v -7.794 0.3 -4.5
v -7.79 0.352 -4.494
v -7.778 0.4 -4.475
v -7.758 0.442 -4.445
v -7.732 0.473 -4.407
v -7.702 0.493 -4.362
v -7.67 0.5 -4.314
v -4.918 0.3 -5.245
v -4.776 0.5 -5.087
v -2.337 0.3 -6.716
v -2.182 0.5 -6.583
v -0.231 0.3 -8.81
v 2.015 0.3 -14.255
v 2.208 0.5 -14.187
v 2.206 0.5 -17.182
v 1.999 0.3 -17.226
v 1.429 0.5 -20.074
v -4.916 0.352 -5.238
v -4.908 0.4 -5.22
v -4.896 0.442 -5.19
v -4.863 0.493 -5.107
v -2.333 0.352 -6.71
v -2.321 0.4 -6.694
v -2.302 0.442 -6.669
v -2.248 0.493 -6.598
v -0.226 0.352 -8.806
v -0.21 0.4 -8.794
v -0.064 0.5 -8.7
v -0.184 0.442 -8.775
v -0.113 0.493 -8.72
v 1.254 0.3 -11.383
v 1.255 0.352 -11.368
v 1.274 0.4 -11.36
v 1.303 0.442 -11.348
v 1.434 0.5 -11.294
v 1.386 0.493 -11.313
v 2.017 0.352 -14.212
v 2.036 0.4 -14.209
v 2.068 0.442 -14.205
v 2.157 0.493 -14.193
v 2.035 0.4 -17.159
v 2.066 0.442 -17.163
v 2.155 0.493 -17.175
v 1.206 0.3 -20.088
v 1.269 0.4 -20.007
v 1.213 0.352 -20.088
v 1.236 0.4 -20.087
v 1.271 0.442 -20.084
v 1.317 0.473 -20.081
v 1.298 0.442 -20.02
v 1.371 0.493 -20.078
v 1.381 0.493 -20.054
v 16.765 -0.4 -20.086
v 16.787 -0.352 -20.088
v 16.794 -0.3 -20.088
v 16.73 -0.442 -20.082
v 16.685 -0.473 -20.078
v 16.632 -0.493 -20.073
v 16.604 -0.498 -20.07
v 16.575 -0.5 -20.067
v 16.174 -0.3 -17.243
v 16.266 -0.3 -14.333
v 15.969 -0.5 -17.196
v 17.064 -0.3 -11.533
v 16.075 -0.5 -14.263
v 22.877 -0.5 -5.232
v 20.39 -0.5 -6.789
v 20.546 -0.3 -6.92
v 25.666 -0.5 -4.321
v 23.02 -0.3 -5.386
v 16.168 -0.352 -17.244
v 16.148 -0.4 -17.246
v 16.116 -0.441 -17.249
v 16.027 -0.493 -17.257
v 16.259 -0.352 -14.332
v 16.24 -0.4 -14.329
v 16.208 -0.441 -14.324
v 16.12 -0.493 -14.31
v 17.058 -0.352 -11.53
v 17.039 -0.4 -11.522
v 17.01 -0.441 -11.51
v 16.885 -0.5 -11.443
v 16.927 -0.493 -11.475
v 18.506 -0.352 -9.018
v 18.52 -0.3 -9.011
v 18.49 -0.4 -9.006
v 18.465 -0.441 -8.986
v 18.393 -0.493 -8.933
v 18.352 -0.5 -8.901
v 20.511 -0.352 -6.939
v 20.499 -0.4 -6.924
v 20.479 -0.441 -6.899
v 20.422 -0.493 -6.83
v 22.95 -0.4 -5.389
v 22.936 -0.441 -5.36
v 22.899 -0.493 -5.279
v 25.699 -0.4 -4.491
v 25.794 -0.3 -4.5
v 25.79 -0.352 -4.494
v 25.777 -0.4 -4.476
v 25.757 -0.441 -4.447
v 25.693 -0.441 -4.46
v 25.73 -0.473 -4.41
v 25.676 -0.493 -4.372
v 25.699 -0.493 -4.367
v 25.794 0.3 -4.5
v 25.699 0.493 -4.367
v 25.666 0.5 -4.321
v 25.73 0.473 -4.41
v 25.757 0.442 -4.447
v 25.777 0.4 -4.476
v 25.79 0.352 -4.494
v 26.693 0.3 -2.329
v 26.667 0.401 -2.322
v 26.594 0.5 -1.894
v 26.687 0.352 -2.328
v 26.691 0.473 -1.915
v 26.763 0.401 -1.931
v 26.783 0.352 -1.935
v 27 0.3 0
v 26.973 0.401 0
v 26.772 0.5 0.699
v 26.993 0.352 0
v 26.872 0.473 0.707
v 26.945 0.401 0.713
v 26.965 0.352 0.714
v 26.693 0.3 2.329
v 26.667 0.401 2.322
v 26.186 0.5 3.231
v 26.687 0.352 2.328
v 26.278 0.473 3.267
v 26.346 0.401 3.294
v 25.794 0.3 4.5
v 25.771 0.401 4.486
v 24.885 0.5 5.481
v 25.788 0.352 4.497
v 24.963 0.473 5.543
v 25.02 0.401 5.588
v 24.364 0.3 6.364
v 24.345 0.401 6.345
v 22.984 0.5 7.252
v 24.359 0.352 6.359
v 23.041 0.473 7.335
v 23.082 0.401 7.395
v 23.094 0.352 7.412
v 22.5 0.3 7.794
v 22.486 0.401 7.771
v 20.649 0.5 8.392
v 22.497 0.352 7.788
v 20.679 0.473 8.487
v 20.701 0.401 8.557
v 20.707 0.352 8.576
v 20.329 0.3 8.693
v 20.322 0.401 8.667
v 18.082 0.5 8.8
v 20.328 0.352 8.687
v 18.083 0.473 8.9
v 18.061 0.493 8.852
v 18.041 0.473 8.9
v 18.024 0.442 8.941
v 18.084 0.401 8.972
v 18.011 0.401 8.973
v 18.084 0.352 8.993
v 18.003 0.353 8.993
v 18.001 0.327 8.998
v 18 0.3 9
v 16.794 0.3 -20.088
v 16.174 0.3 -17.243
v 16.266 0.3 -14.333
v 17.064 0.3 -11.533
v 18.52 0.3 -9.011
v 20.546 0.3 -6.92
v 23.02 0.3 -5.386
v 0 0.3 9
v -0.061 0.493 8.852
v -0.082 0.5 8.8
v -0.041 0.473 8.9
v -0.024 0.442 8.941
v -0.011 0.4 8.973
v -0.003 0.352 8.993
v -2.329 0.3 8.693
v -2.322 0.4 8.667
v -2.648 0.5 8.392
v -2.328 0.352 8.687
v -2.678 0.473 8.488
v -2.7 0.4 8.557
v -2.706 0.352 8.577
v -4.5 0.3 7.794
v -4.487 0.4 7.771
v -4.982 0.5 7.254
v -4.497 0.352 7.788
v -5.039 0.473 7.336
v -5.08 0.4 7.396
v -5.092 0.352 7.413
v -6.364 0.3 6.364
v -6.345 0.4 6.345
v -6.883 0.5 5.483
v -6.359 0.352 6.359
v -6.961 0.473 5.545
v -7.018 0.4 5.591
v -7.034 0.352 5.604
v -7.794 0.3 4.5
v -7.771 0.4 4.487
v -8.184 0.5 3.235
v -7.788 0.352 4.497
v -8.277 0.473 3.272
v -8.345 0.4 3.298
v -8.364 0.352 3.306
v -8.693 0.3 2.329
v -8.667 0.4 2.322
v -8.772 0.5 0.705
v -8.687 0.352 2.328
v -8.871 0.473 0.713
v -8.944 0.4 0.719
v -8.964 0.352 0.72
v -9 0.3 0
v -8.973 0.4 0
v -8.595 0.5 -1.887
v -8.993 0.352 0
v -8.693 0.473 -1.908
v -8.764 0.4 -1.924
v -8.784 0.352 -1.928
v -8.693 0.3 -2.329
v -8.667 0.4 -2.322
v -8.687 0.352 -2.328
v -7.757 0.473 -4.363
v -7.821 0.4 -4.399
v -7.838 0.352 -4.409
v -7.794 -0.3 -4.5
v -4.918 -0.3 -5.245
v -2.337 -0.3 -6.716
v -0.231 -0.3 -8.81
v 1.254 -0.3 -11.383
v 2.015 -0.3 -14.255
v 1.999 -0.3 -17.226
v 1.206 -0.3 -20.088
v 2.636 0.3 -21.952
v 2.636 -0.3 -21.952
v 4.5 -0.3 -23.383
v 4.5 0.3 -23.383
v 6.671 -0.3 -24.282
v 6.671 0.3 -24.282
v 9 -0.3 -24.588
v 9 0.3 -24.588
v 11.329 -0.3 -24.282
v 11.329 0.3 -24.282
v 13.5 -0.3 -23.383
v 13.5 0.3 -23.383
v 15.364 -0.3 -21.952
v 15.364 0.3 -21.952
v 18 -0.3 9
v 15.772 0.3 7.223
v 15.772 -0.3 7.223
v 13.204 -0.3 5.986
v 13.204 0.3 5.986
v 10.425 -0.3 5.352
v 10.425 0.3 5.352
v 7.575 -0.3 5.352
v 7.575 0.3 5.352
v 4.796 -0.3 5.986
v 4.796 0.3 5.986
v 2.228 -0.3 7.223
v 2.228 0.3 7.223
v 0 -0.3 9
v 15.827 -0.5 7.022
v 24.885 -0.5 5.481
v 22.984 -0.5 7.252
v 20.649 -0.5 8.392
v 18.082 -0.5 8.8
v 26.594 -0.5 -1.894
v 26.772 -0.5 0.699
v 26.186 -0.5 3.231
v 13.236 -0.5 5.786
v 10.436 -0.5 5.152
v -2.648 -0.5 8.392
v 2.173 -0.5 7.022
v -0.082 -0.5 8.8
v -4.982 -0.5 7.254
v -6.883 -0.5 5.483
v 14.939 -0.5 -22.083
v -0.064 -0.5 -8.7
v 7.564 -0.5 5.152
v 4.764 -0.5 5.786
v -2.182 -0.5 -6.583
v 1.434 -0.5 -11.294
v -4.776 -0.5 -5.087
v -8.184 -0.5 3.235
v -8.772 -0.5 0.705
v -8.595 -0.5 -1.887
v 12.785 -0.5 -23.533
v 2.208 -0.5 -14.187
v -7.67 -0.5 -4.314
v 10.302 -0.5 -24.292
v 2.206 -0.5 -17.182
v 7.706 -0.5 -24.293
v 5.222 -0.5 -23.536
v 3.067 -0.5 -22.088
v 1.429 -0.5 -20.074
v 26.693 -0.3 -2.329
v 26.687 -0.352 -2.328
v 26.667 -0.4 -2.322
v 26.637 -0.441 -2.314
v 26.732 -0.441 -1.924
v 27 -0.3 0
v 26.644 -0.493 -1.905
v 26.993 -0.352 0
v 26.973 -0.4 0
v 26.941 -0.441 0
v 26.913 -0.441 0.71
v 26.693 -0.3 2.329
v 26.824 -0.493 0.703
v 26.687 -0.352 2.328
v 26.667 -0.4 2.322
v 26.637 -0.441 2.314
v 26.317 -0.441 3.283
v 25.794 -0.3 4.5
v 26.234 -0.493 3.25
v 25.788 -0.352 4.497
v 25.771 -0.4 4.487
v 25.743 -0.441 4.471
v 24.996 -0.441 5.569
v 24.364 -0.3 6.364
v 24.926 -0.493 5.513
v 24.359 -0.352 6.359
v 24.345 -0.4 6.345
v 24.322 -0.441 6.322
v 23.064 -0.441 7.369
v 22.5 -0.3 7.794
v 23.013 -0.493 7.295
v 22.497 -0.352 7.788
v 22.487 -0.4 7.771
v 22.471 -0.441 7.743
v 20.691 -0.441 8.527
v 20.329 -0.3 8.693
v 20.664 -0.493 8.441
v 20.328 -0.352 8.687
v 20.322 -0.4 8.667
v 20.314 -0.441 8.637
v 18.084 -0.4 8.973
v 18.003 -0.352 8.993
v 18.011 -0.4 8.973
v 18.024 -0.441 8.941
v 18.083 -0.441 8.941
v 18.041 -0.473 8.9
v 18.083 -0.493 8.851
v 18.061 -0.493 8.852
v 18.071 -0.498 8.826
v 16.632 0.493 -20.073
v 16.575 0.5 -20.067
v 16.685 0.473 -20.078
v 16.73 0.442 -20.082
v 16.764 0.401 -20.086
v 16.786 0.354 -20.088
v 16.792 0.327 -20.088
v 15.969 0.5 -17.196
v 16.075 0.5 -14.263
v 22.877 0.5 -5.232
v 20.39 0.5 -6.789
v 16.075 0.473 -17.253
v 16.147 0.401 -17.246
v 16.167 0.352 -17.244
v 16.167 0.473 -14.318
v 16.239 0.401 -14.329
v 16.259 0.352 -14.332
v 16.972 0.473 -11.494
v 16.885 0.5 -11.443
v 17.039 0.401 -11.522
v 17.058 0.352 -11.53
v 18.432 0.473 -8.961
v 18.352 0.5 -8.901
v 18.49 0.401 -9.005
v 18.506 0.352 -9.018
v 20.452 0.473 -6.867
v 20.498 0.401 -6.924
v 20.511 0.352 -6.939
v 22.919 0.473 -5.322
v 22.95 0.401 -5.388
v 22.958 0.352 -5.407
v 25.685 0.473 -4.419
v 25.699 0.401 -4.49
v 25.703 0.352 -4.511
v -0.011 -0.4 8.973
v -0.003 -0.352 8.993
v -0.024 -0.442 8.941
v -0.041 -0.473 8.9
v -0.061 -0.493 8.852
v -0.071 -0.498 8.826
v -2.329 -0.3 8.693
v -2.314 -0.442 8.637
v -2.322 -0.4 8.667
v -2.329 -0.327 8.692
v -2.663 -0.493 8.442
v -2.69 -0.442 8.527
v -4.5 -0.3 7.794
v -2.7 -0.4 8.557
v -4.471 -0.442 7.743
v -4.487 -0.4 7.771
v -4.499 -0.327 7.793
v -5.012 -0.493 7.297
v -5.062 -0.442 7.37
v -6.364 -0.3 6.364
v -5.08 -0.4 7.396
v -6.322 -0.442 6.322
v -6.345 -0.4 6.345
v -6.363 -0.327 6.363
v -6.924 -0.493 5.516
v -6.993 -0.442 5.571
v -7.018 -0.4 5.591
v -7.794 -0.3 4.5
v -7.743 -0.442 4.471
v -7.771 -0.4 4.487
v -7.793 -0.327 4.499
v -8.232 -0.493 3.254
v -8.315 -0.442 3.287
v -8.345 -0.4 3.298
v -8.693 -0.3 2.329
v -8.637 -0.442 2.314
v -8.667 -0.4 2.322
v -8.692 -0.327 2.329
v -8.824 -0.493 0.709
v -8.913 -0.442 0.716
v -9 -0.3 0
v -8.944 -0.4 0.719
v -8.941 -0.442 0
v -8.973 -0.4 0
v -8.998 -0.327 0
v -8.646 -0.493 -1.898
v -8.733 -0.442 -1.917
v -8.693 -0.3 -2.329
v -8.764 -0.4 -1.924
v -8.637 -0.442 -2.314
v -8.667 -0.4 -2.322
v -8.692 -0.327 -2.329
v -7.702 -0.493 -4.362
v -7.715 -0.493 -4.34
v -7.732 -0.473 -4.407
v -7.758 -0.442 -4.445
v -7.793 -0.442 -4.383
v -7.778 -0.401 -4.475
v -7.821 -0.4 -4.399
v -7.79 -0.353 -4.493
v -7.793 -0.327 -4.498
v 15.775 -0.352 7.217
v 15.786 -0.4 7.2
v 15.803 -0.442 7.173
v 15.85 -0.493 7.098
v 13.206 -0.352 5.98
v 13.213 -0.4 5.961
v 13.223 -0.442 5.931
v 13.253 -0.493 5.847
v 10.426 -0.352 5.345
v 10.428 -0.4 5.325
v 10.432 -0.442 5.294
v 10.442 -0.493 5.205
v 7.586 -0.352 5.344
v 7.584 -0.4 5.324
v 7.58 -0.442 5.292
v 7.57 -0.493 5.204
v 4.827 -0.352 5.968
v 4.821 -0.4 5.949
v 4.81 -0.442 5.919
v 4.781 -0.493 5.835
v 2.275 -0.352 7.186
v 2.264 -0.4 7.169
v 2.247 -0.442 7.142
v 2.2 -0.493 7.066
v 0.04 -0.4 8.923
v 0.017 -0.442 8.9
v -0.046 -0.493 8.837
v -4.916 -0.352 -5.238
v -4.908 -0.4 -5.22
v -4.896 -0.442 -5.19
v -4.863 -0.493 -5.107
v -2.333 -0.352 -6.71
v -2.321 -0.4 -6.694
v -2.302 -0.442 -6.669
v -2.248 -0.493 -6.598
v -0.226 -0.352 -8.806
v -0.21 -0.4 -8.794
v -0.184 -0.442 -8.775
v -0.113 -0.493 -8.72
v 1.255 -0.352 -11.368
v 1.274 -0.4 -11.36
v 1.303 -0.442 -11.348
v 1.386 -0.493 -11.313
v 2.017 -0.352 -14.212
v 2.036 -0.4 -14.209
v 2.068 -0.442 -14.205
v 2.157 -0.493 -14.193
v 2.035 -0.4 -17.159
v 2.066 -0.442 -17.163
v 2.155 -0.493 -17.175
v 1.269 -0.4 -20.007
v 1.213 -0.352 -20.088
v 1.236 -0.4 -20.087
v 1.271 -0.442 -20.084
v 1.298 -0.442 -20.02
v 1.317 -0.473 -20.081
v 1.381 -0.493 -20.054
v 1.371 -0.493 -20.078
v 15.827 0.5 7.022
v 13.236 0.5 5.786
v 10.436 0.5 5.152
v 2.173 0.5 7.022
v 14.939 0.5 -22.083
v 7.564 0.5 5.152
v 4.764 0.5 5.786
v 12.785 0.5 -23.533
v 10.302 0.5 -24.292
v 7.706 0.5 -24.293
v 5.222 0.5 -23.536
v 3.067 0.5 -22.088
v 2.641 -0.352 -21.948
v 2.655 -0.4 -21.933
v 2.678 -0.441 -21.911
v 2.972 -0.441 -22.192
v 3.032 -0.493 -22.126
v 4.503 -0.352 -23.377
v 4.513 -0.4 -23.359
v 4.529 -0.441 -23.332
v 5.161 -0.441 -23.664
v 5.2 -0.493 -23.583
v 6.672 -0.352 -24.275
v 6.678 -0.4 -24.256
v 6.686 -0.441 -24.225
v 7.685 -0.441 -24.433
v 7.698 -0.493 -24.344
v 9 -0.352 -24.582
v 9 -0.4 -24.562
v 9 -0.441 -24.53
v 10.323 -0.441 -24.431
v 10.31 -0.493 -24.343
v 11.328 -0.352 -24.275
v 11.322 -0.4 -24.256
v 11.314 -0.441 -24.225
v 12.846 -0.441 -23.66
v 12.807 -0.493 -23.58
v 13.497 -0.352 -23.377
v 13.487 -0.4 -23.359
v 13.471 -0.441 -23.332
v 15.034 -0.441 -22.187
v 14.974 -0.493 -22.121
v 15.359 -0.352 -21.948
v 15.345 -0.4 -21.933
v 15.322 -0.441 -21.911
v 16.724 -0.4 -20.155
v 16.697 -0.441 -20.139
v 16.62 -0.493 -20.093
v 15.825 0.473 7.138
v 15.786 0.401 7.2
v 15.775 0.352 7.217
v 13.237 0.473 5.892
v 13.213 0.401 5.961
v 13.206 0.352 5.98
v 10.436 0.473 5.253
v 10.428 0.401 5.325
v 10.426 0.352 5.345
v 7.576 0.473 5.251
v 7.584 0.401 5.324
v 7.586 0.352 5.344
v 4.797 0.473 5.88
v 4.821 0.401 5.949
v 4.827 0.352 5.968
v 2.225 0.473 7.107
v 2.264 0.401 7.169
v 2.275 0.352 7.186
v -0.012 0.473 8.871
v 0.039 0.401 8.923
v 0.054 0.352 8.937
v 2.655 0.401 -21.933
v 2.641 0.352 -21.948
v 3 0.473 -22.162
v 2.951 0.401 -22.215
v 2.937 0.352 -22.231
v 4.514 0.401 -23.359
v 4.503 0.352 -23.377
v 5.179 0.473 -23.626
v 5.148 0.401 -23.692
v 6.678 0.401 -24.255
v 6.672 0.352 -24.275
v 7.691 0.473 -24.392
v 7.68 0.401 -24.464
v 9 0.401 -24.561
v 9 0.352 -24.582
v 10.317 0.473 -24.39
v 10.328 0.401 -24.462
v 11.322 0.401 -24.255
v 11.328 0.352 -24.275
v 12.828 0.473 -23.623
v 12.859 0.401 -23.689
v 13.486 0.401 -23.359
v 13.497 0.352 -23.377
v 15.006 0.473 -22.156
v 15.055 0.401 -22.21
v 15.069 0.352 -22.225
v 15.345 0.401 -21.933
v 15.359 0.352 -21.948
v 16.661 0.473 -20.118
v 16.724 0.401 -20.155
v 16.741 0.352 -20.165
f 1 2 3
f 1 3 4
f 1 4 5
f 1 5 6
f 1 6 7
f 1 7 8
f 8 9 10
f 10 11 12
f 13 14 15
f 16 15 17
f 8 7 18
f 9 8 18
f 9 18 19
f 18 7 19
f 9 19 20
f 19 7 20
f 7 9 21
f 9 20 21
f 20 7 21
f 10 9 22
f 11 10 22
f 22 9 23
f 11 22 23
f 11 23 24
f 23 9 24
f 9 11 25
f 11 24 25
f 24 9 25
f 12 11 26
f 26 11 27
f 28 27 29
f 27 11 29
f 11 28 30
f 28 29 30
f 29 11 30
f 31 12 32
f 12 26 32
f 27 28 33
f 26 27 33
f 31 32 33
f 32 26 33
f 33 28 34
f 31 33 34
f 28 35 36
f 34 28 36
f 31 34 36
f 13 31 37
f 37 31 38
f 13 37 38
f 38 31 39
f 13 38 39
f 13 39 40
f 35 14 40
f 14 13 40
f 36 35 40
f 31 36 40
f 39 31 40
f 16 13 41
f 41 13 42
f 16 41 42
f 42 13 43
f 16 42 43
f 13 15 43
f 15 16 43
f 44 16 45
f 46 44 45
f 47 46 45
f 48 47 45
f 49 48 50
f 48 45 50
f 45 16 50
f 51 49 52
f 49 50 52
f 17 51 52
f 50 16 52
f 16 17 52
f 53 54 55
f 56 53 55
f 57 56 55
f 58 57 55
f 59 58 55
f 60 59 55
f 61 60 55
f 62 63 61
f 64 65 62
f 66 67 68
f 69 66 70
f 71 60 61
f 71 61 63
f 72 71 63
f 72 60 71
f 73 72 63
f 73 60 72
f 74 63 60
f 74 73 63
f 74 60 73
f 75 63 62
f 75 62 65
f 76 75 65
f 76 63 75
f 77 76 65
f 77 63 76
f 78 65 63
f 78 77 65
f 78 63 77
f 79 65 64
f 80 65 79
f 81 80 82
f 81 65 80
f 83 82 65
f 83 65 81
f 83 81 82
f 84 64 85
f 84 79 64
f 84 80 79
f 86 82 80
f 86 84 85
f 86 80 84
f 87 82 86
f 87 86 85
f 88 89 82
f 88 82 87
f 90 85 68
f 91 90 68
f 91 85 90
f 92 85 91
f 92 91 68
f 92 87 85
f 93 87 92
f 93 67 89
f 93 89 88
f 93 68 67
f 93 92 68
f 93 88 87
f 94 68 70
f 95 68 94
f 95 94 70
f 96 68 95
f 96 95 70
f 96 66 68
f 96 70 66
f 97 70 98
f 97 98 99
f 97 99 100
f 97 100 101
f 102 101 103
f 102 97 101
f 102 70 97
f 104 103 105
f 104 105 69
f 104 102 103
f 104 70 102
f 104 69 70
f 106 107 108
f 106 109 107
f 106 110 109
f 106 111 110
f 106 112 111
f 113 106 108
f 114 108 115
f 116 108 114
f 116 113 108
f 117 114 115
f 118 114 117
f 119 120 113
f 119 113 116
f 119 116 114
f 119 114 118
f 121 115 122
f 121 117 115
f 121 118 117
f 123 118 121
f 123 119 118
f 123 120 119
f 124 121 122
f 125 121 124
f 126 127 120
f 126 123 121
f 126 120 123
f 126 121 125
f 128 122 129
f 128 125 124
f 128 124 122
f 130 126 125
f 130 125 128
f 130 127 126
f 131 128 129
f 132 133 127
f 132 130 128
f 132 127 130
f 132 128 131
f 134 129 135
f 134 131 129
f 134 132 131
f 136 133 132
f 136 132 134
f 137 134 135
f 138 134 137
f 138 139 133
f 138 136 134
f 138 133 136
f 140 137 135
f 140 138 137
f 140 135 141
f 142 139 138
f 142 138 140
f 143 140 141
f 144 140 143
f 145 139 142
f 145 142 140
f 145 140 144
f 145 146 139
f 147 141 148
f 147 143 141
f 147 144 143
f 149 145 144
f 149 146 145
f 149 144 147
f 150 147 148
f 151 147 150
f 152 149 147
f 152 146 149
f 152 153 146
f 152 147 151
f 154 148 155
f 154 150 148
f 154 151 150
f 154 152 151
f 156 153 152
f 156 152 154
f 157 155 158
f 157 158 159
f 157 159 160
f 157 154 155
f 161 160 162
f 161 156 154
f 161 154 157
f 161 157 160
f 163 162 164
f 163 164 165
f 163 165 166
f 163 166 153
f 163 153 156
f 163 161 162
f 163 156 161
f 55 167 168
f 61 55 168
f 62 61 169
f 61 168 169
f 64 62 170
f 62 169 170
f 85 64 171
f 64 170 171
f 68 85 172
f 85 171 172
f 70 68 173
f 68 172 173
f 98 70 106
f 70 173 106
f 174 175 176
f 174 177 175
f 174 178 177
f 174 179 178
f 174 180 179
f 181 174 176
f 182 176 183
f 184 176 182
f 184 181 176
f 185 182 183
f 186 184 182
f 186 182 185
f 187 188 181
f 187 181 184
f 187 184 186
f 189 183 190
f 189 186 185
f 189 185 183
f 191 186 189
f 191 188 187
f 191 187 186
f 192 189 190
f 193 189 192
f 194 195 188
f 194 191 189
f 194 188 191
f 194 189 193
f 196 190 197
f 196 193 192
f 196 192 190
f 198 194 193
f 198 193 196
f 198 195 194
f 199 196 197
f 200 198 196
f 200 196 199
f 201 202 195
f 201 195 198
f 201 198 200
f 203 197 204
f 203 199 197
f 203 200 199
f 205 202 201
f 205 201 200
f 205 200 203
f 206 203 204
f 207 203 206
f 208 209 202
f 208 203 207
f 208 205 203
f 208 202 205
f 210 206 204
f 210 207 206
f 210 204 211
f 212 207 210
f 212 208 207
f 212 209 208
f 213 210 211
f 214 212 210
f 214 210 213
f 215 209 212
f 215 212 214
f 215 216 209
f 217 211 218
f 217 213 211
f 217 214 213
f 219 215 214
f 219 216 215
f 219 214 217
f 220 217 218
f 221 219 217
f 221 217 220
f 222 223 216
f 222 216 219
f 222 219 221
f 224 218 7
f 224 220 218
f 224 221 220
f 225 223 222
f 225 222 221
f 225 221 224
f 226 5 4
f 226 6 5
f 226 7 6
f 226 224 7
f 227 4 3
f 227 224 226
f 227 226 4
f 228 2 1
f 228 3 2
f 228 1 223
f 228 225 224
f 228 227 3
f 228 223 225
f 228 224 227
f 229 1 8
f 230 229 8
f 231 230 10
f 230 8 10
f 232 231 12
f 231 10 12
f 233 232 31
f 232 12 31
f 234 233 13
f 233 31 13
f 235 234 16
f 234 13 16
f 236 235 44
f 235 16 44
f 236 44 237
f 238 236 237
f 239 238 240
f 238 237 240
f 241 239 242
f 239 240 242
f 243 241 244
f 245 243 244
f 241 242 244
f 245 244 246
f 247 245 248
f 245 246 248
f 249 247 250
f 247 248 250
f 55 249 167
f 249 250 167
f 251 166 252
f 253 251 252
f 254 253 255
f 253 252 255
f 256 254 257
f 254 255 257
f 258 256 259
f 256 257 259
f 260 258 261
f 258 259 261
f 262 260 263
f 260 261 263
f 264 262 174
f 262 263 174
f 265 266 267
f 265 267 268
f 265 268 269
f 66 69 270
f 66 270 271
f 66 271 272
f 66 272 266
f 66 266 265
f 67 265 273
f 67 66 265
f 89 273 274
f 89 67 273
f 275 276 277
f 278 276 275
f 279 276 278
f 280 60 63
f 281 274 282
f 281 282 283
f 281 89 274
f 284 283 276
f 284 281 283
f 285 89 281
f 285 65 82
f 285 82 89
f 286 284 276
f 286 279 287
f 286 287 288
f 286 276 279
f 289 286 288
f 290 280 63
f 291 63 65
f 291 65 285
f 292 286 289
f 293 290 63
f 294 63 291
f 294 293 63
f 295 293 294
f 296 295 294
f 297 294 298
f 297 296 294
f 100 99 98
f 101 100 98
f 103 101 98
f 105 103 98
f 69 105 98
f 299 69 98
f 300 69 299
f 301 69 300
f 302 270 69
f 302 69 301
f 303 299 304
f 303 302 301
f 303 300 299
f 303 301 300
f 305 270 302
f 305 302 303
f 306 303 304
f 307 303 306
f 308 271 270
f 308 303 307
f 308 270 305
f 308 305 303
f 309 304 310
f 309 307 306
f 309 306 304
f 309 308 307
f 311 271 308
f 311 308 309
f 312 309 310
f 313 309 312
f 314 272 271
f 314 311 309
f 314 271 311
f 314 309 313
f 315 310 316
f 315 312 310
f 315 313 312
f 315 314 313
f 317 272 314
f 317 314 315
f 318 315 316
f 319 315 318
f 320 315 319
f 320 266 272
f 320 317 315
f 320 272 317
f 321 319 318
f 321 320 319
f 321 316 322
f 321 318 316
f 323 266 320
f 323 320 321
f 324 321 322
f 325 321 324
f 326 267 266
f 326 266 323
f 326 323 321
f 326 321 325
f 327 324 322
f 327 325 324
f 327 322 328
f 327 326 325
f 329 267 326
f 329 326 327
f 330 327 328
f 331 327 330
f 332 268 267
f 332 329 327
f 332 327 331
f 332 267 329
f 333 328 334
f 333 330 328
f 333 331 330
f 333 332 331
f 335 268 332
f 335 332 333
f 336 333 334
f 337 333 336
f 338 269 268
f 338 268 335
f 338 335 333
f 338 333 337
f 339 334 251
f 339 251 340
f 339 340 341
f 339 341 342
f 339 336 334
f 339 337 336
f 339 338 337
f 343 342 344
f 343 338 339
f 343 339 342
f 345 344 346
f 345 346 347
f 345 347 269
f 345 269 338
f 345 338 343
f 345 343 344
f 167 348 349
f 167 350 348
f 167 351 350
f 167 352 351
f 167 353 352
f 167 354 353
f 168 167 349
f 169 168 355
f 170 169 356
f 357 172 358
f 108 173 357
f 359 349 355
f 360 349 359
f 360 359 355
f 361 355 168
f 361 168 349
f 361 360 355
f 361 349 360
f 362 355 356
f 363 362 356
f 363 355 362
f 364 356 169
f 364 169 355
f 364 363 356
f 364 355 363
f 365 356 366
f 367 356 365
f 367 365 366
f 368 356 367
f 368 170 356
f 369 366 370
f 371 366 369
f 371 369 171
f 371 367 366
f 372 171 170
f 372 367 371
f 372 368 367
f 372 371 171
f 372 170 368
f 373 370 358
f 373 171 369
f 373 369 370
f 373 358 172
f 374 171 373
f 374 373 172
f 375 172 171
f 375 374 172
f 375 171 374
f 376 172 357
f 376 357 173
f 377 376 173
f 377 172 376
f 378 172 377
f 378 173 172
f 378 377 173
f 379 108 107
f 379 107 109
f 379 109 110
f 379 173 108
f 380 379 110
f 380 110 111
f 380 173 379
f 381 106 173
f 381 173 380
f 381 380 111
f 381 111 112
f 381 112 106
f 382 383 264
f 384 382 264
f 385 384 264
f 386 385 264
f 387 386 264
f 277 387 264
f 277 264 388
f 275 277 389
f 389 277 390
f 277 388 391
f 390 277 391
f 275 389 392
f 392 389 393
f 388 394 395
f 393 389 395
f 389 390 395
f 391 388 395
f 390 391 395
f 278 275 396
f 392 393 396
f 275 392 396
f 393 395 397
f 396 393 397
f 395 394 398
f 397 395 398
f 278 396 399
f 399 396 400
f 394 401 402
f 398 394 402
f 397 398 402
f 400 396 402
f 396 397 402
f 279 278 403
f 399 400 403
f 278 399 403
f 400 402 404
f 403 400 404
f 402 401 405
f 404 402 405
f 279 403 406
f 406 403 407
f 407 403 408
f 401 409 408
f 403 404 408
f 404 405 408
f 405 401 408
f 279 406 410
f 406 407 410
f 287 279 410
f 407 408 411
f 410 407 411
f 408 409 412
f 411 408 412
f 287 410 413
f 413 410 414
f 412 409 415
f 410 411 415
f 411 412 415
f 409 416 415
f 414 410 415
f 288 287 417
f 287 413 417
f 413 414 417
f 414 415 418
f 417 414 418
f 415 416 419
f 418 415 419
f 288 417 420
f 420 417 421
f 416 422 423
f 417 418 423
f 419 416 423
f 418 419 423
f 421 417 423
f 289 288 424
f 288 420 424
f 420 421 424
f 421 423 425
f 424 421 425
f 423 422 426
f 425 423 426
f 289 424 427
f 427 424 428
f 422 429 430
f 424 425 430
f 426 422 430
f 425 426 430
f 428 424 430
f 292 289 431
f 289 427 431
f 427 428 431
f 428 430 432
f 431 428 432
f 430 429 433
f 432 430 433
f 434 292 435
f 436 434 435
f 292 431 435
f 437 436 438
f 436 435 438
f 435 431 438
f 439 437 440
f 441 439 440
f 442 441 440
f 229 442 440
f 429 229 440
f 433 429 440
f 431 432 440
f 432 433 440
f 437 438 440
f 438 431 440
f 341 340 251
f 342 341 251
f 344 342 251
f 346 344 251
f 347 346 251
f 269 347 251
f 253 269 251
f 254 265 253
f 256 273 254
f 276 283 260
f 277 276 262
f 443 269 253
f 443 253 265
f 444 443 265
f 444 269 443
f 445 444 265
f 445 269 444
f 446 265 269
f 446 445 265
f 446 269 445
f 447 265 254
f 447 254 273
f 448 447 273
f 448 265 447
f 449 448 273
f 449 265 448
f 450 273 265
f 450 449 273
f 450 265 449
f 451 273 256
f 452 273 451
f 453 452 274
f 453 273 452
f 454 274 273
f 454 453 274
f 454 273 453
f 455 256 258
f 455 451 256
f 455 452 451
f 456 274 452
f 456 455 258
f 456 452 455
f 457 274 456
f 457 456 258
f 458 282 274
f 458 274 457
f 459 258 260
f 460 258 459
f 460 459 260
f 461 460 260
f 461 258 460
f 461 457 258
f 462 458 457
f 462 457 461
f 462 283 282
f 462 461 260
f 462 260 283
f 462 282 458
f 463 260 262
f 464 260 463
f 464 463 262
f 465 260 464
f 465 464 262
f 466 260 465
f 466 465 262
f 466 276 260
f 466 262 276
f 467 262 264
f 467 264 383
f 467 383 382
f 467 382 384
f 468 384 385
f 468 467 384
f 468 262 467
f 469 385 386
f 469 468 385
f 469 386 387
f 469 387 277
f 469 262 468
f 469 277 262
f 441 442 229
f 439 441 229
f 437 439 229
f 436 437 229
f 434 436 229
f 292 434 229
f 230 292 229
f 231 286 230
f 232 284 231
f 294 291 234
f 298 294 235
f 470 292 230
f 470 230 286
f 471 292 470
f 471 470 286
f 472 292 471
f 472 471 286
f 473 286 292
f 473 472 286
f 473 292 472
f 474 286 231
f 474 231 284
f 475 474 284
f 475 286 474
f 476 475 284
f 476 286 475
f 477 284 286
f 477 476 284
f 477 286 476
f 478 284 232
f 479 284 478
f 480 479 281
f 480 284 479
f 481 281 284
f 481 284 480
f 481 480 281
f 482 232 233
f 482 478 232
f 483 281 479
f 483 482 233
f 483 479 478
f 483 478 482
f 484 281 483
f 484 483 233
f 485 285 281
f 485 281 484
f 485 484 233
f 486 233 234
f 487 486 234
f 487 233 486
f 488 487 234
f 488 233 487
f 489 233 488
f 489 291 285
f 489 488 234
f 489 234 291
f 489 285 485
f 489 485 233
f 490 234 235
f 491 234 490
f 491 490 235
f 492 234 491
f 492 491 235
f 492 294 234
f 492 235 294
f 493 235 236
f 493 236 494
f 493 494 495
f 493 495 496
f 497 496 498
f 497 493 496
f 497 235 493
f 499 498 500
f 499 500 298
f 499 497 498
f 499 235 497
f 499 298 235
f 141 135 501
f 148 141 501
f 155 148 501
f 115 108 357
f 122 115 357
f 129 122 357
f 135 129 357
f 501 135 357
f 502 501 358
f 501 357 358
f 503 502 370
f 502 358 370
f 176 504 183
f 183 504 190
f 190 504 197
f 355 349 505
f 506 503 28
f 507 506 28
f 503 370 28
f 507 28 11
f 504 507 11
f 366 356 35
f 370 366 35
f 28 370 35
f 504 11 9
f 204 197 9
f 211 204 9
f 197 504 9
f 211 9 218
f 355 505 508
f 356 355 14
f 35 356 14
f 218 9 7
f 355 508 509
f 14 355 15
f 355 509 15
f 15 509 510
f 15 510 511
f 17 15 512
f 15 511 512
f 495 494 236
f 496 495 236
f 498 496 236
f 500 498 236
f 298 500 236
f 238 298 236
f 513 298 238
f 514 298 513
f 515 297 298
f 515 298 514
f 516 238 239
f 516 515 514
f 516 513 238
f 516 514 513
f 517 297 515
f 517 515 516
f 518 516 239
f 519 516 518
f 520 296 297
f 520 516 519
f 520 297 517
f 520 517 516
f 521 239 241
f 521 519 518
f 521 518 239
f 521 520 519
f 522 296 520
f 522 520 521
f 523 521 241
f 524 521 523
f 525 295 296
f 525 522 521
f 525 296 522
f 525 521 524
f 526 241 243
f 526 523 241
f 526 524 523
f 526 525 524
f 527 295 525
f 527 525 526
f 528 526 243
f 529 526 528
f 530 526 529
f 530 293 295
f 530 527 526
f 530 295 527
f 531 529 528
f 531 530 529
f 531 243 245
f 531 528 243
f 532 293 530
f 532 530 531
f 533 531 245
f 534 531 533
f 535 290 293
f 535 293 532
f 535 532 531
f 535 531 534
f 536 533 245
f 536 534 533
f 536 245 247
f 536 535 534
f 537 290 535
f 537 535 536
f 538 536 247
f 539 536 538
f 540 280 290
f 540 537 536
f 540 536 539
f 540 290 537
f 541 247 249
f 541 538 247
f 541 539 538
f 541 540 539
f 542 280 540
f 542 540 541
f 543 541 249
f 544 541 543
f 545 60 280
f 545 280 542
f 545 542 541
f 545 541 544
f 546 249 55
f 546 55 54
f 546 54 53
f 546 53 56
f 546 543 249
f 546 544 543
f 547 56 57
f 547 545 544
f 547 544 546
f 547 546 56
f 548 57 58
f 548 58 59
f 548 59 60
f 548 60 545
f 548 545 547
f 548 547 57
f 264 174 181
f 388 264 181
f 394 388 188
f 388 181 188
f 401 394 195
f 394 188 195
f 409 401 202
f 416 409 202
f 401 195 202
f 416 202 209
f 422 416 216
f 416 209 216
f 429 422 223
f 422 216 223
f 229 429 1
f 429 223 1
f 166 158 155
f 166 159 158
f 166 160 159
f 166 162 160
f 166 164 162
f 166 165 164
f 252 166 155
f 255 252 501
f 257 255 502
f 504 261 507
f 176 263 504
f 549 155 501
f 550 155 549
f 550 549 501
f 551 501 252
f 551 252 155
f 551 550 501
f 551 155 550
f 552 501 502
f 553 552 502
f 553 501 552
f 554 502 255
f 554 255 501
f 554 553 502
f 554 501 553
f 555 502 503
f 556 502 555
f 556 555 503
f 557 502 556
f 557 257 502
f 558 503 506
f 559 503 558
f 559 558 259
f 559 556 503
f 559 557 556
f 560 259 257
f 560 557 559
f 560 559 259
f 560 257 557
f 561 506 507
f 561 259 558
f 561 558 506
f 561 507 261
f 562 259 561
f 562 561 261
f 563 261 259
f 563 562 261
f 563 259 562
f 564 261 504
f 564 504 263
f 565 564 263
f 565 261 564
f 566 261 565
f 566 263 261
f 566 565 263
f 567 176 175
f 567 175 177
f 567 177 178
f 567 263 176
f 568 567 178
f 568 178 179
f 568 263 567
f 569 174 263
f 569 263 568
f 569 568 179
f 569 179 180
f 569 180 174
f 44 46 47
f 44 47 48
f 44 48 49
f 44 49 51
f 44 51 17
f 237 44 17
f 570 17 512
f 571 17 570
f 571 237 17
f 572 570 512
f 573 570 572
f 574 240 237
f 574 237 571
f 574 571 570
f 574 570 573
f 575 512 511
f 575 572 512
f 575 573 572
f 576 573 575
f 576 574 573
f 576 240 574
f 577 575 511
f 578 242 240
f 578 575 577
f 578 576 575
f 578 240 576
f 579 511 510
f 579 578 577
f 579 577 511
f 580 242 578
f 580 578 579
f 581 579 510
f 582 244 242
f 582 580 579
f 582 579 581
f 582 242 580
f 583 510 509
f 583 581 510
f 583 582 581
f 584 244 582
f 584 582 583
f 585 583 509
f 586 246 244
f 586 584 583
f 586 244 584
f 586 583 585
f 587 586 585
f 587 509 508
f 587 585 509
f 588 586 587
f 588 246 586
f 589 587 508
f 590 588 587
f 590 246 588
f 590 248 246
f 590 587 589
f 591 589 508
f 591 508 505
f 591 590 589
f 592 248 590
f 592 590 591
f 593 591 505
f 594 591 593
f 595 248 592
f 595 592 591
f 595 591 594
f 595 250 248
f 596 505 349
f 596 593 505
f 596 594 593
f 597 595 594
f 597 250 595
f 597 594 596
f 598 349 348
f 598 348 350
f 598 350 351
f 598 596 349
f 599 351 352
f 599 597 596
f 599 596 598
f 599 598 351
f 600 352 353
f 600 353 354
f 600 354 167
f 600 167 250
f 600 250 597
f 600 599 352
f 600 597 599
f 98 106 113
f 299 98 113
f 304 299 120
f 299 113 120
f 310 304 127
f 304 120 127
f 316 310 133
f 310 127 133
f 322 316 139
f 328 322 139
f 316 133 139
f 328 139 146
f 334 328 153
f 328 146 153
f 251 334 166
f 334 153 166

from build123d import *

# Parameters (mm, degrees)
BOSS_EXTRUDE1_DEPTH = 0.5
FILLET1_R           = 0.2


with BuildPart() as part:
    # Sketch1 → Boss-Extrude1 (new body, symmetric)
    with BuildSketch(Plane(origin=(0, 0, 0), x_dir=(1, 0, 0), z_dir=(0, 1, 0))):
        with BuildLine():
            ThreePointArc((-7.794228634, 4.5), (0.59695643, 10.04765189), (1.205771366, 20.088457268))
            ThreePointArc((1.205771366, 20.088457268), (9, 24.588457268), (16.794228634, 20.088457268))
            ThreePointArc((16.794228634, 20.088457268), (17.714119694, 10.227251774), (25.794228634, 4.5))
            ThreePointArc((25.794228634, 4.5), (25.794228634, -4.5), (18, -9))
            ThreePointArc((18, -9), (9, -5.272077939), (0, -9))
            ThreePointArc((0, -9), (-7.794228634, -4.5), (-7.794228634, 4.5))
        make_face()
    extrude(amount=BOSS_EXTRUDE1_DEPTH, both=True)

    # Fillet1
    fillet1_edges = [part.edges().sort_by_distance(p)[0] for p in [
        (0.59695643, 0.5, -10.04765189),
        (-7.794228634, 0.5, 4.5),
        (9, 0.5, 5.272077939),
        (25.794228634, 0.5, 4.5),
        (17.714119694, 0.5, -10.227251774),
        (25.794228634, -0.5, 4.5),
        (9, -0.5, 5.272077939),
        (-7.794228634, -0.5, 4.5),
        (9, 0.5, -24.588457268),
        (0.59695643, -0.5, -10.04765189),
        (9, -0.5, -24.588457268),
        (17.714119694, -0.5, -10.227251774),
    ]]
    fillet(fillet1_edges, radius=FILLET1_R)


solid = part.part
